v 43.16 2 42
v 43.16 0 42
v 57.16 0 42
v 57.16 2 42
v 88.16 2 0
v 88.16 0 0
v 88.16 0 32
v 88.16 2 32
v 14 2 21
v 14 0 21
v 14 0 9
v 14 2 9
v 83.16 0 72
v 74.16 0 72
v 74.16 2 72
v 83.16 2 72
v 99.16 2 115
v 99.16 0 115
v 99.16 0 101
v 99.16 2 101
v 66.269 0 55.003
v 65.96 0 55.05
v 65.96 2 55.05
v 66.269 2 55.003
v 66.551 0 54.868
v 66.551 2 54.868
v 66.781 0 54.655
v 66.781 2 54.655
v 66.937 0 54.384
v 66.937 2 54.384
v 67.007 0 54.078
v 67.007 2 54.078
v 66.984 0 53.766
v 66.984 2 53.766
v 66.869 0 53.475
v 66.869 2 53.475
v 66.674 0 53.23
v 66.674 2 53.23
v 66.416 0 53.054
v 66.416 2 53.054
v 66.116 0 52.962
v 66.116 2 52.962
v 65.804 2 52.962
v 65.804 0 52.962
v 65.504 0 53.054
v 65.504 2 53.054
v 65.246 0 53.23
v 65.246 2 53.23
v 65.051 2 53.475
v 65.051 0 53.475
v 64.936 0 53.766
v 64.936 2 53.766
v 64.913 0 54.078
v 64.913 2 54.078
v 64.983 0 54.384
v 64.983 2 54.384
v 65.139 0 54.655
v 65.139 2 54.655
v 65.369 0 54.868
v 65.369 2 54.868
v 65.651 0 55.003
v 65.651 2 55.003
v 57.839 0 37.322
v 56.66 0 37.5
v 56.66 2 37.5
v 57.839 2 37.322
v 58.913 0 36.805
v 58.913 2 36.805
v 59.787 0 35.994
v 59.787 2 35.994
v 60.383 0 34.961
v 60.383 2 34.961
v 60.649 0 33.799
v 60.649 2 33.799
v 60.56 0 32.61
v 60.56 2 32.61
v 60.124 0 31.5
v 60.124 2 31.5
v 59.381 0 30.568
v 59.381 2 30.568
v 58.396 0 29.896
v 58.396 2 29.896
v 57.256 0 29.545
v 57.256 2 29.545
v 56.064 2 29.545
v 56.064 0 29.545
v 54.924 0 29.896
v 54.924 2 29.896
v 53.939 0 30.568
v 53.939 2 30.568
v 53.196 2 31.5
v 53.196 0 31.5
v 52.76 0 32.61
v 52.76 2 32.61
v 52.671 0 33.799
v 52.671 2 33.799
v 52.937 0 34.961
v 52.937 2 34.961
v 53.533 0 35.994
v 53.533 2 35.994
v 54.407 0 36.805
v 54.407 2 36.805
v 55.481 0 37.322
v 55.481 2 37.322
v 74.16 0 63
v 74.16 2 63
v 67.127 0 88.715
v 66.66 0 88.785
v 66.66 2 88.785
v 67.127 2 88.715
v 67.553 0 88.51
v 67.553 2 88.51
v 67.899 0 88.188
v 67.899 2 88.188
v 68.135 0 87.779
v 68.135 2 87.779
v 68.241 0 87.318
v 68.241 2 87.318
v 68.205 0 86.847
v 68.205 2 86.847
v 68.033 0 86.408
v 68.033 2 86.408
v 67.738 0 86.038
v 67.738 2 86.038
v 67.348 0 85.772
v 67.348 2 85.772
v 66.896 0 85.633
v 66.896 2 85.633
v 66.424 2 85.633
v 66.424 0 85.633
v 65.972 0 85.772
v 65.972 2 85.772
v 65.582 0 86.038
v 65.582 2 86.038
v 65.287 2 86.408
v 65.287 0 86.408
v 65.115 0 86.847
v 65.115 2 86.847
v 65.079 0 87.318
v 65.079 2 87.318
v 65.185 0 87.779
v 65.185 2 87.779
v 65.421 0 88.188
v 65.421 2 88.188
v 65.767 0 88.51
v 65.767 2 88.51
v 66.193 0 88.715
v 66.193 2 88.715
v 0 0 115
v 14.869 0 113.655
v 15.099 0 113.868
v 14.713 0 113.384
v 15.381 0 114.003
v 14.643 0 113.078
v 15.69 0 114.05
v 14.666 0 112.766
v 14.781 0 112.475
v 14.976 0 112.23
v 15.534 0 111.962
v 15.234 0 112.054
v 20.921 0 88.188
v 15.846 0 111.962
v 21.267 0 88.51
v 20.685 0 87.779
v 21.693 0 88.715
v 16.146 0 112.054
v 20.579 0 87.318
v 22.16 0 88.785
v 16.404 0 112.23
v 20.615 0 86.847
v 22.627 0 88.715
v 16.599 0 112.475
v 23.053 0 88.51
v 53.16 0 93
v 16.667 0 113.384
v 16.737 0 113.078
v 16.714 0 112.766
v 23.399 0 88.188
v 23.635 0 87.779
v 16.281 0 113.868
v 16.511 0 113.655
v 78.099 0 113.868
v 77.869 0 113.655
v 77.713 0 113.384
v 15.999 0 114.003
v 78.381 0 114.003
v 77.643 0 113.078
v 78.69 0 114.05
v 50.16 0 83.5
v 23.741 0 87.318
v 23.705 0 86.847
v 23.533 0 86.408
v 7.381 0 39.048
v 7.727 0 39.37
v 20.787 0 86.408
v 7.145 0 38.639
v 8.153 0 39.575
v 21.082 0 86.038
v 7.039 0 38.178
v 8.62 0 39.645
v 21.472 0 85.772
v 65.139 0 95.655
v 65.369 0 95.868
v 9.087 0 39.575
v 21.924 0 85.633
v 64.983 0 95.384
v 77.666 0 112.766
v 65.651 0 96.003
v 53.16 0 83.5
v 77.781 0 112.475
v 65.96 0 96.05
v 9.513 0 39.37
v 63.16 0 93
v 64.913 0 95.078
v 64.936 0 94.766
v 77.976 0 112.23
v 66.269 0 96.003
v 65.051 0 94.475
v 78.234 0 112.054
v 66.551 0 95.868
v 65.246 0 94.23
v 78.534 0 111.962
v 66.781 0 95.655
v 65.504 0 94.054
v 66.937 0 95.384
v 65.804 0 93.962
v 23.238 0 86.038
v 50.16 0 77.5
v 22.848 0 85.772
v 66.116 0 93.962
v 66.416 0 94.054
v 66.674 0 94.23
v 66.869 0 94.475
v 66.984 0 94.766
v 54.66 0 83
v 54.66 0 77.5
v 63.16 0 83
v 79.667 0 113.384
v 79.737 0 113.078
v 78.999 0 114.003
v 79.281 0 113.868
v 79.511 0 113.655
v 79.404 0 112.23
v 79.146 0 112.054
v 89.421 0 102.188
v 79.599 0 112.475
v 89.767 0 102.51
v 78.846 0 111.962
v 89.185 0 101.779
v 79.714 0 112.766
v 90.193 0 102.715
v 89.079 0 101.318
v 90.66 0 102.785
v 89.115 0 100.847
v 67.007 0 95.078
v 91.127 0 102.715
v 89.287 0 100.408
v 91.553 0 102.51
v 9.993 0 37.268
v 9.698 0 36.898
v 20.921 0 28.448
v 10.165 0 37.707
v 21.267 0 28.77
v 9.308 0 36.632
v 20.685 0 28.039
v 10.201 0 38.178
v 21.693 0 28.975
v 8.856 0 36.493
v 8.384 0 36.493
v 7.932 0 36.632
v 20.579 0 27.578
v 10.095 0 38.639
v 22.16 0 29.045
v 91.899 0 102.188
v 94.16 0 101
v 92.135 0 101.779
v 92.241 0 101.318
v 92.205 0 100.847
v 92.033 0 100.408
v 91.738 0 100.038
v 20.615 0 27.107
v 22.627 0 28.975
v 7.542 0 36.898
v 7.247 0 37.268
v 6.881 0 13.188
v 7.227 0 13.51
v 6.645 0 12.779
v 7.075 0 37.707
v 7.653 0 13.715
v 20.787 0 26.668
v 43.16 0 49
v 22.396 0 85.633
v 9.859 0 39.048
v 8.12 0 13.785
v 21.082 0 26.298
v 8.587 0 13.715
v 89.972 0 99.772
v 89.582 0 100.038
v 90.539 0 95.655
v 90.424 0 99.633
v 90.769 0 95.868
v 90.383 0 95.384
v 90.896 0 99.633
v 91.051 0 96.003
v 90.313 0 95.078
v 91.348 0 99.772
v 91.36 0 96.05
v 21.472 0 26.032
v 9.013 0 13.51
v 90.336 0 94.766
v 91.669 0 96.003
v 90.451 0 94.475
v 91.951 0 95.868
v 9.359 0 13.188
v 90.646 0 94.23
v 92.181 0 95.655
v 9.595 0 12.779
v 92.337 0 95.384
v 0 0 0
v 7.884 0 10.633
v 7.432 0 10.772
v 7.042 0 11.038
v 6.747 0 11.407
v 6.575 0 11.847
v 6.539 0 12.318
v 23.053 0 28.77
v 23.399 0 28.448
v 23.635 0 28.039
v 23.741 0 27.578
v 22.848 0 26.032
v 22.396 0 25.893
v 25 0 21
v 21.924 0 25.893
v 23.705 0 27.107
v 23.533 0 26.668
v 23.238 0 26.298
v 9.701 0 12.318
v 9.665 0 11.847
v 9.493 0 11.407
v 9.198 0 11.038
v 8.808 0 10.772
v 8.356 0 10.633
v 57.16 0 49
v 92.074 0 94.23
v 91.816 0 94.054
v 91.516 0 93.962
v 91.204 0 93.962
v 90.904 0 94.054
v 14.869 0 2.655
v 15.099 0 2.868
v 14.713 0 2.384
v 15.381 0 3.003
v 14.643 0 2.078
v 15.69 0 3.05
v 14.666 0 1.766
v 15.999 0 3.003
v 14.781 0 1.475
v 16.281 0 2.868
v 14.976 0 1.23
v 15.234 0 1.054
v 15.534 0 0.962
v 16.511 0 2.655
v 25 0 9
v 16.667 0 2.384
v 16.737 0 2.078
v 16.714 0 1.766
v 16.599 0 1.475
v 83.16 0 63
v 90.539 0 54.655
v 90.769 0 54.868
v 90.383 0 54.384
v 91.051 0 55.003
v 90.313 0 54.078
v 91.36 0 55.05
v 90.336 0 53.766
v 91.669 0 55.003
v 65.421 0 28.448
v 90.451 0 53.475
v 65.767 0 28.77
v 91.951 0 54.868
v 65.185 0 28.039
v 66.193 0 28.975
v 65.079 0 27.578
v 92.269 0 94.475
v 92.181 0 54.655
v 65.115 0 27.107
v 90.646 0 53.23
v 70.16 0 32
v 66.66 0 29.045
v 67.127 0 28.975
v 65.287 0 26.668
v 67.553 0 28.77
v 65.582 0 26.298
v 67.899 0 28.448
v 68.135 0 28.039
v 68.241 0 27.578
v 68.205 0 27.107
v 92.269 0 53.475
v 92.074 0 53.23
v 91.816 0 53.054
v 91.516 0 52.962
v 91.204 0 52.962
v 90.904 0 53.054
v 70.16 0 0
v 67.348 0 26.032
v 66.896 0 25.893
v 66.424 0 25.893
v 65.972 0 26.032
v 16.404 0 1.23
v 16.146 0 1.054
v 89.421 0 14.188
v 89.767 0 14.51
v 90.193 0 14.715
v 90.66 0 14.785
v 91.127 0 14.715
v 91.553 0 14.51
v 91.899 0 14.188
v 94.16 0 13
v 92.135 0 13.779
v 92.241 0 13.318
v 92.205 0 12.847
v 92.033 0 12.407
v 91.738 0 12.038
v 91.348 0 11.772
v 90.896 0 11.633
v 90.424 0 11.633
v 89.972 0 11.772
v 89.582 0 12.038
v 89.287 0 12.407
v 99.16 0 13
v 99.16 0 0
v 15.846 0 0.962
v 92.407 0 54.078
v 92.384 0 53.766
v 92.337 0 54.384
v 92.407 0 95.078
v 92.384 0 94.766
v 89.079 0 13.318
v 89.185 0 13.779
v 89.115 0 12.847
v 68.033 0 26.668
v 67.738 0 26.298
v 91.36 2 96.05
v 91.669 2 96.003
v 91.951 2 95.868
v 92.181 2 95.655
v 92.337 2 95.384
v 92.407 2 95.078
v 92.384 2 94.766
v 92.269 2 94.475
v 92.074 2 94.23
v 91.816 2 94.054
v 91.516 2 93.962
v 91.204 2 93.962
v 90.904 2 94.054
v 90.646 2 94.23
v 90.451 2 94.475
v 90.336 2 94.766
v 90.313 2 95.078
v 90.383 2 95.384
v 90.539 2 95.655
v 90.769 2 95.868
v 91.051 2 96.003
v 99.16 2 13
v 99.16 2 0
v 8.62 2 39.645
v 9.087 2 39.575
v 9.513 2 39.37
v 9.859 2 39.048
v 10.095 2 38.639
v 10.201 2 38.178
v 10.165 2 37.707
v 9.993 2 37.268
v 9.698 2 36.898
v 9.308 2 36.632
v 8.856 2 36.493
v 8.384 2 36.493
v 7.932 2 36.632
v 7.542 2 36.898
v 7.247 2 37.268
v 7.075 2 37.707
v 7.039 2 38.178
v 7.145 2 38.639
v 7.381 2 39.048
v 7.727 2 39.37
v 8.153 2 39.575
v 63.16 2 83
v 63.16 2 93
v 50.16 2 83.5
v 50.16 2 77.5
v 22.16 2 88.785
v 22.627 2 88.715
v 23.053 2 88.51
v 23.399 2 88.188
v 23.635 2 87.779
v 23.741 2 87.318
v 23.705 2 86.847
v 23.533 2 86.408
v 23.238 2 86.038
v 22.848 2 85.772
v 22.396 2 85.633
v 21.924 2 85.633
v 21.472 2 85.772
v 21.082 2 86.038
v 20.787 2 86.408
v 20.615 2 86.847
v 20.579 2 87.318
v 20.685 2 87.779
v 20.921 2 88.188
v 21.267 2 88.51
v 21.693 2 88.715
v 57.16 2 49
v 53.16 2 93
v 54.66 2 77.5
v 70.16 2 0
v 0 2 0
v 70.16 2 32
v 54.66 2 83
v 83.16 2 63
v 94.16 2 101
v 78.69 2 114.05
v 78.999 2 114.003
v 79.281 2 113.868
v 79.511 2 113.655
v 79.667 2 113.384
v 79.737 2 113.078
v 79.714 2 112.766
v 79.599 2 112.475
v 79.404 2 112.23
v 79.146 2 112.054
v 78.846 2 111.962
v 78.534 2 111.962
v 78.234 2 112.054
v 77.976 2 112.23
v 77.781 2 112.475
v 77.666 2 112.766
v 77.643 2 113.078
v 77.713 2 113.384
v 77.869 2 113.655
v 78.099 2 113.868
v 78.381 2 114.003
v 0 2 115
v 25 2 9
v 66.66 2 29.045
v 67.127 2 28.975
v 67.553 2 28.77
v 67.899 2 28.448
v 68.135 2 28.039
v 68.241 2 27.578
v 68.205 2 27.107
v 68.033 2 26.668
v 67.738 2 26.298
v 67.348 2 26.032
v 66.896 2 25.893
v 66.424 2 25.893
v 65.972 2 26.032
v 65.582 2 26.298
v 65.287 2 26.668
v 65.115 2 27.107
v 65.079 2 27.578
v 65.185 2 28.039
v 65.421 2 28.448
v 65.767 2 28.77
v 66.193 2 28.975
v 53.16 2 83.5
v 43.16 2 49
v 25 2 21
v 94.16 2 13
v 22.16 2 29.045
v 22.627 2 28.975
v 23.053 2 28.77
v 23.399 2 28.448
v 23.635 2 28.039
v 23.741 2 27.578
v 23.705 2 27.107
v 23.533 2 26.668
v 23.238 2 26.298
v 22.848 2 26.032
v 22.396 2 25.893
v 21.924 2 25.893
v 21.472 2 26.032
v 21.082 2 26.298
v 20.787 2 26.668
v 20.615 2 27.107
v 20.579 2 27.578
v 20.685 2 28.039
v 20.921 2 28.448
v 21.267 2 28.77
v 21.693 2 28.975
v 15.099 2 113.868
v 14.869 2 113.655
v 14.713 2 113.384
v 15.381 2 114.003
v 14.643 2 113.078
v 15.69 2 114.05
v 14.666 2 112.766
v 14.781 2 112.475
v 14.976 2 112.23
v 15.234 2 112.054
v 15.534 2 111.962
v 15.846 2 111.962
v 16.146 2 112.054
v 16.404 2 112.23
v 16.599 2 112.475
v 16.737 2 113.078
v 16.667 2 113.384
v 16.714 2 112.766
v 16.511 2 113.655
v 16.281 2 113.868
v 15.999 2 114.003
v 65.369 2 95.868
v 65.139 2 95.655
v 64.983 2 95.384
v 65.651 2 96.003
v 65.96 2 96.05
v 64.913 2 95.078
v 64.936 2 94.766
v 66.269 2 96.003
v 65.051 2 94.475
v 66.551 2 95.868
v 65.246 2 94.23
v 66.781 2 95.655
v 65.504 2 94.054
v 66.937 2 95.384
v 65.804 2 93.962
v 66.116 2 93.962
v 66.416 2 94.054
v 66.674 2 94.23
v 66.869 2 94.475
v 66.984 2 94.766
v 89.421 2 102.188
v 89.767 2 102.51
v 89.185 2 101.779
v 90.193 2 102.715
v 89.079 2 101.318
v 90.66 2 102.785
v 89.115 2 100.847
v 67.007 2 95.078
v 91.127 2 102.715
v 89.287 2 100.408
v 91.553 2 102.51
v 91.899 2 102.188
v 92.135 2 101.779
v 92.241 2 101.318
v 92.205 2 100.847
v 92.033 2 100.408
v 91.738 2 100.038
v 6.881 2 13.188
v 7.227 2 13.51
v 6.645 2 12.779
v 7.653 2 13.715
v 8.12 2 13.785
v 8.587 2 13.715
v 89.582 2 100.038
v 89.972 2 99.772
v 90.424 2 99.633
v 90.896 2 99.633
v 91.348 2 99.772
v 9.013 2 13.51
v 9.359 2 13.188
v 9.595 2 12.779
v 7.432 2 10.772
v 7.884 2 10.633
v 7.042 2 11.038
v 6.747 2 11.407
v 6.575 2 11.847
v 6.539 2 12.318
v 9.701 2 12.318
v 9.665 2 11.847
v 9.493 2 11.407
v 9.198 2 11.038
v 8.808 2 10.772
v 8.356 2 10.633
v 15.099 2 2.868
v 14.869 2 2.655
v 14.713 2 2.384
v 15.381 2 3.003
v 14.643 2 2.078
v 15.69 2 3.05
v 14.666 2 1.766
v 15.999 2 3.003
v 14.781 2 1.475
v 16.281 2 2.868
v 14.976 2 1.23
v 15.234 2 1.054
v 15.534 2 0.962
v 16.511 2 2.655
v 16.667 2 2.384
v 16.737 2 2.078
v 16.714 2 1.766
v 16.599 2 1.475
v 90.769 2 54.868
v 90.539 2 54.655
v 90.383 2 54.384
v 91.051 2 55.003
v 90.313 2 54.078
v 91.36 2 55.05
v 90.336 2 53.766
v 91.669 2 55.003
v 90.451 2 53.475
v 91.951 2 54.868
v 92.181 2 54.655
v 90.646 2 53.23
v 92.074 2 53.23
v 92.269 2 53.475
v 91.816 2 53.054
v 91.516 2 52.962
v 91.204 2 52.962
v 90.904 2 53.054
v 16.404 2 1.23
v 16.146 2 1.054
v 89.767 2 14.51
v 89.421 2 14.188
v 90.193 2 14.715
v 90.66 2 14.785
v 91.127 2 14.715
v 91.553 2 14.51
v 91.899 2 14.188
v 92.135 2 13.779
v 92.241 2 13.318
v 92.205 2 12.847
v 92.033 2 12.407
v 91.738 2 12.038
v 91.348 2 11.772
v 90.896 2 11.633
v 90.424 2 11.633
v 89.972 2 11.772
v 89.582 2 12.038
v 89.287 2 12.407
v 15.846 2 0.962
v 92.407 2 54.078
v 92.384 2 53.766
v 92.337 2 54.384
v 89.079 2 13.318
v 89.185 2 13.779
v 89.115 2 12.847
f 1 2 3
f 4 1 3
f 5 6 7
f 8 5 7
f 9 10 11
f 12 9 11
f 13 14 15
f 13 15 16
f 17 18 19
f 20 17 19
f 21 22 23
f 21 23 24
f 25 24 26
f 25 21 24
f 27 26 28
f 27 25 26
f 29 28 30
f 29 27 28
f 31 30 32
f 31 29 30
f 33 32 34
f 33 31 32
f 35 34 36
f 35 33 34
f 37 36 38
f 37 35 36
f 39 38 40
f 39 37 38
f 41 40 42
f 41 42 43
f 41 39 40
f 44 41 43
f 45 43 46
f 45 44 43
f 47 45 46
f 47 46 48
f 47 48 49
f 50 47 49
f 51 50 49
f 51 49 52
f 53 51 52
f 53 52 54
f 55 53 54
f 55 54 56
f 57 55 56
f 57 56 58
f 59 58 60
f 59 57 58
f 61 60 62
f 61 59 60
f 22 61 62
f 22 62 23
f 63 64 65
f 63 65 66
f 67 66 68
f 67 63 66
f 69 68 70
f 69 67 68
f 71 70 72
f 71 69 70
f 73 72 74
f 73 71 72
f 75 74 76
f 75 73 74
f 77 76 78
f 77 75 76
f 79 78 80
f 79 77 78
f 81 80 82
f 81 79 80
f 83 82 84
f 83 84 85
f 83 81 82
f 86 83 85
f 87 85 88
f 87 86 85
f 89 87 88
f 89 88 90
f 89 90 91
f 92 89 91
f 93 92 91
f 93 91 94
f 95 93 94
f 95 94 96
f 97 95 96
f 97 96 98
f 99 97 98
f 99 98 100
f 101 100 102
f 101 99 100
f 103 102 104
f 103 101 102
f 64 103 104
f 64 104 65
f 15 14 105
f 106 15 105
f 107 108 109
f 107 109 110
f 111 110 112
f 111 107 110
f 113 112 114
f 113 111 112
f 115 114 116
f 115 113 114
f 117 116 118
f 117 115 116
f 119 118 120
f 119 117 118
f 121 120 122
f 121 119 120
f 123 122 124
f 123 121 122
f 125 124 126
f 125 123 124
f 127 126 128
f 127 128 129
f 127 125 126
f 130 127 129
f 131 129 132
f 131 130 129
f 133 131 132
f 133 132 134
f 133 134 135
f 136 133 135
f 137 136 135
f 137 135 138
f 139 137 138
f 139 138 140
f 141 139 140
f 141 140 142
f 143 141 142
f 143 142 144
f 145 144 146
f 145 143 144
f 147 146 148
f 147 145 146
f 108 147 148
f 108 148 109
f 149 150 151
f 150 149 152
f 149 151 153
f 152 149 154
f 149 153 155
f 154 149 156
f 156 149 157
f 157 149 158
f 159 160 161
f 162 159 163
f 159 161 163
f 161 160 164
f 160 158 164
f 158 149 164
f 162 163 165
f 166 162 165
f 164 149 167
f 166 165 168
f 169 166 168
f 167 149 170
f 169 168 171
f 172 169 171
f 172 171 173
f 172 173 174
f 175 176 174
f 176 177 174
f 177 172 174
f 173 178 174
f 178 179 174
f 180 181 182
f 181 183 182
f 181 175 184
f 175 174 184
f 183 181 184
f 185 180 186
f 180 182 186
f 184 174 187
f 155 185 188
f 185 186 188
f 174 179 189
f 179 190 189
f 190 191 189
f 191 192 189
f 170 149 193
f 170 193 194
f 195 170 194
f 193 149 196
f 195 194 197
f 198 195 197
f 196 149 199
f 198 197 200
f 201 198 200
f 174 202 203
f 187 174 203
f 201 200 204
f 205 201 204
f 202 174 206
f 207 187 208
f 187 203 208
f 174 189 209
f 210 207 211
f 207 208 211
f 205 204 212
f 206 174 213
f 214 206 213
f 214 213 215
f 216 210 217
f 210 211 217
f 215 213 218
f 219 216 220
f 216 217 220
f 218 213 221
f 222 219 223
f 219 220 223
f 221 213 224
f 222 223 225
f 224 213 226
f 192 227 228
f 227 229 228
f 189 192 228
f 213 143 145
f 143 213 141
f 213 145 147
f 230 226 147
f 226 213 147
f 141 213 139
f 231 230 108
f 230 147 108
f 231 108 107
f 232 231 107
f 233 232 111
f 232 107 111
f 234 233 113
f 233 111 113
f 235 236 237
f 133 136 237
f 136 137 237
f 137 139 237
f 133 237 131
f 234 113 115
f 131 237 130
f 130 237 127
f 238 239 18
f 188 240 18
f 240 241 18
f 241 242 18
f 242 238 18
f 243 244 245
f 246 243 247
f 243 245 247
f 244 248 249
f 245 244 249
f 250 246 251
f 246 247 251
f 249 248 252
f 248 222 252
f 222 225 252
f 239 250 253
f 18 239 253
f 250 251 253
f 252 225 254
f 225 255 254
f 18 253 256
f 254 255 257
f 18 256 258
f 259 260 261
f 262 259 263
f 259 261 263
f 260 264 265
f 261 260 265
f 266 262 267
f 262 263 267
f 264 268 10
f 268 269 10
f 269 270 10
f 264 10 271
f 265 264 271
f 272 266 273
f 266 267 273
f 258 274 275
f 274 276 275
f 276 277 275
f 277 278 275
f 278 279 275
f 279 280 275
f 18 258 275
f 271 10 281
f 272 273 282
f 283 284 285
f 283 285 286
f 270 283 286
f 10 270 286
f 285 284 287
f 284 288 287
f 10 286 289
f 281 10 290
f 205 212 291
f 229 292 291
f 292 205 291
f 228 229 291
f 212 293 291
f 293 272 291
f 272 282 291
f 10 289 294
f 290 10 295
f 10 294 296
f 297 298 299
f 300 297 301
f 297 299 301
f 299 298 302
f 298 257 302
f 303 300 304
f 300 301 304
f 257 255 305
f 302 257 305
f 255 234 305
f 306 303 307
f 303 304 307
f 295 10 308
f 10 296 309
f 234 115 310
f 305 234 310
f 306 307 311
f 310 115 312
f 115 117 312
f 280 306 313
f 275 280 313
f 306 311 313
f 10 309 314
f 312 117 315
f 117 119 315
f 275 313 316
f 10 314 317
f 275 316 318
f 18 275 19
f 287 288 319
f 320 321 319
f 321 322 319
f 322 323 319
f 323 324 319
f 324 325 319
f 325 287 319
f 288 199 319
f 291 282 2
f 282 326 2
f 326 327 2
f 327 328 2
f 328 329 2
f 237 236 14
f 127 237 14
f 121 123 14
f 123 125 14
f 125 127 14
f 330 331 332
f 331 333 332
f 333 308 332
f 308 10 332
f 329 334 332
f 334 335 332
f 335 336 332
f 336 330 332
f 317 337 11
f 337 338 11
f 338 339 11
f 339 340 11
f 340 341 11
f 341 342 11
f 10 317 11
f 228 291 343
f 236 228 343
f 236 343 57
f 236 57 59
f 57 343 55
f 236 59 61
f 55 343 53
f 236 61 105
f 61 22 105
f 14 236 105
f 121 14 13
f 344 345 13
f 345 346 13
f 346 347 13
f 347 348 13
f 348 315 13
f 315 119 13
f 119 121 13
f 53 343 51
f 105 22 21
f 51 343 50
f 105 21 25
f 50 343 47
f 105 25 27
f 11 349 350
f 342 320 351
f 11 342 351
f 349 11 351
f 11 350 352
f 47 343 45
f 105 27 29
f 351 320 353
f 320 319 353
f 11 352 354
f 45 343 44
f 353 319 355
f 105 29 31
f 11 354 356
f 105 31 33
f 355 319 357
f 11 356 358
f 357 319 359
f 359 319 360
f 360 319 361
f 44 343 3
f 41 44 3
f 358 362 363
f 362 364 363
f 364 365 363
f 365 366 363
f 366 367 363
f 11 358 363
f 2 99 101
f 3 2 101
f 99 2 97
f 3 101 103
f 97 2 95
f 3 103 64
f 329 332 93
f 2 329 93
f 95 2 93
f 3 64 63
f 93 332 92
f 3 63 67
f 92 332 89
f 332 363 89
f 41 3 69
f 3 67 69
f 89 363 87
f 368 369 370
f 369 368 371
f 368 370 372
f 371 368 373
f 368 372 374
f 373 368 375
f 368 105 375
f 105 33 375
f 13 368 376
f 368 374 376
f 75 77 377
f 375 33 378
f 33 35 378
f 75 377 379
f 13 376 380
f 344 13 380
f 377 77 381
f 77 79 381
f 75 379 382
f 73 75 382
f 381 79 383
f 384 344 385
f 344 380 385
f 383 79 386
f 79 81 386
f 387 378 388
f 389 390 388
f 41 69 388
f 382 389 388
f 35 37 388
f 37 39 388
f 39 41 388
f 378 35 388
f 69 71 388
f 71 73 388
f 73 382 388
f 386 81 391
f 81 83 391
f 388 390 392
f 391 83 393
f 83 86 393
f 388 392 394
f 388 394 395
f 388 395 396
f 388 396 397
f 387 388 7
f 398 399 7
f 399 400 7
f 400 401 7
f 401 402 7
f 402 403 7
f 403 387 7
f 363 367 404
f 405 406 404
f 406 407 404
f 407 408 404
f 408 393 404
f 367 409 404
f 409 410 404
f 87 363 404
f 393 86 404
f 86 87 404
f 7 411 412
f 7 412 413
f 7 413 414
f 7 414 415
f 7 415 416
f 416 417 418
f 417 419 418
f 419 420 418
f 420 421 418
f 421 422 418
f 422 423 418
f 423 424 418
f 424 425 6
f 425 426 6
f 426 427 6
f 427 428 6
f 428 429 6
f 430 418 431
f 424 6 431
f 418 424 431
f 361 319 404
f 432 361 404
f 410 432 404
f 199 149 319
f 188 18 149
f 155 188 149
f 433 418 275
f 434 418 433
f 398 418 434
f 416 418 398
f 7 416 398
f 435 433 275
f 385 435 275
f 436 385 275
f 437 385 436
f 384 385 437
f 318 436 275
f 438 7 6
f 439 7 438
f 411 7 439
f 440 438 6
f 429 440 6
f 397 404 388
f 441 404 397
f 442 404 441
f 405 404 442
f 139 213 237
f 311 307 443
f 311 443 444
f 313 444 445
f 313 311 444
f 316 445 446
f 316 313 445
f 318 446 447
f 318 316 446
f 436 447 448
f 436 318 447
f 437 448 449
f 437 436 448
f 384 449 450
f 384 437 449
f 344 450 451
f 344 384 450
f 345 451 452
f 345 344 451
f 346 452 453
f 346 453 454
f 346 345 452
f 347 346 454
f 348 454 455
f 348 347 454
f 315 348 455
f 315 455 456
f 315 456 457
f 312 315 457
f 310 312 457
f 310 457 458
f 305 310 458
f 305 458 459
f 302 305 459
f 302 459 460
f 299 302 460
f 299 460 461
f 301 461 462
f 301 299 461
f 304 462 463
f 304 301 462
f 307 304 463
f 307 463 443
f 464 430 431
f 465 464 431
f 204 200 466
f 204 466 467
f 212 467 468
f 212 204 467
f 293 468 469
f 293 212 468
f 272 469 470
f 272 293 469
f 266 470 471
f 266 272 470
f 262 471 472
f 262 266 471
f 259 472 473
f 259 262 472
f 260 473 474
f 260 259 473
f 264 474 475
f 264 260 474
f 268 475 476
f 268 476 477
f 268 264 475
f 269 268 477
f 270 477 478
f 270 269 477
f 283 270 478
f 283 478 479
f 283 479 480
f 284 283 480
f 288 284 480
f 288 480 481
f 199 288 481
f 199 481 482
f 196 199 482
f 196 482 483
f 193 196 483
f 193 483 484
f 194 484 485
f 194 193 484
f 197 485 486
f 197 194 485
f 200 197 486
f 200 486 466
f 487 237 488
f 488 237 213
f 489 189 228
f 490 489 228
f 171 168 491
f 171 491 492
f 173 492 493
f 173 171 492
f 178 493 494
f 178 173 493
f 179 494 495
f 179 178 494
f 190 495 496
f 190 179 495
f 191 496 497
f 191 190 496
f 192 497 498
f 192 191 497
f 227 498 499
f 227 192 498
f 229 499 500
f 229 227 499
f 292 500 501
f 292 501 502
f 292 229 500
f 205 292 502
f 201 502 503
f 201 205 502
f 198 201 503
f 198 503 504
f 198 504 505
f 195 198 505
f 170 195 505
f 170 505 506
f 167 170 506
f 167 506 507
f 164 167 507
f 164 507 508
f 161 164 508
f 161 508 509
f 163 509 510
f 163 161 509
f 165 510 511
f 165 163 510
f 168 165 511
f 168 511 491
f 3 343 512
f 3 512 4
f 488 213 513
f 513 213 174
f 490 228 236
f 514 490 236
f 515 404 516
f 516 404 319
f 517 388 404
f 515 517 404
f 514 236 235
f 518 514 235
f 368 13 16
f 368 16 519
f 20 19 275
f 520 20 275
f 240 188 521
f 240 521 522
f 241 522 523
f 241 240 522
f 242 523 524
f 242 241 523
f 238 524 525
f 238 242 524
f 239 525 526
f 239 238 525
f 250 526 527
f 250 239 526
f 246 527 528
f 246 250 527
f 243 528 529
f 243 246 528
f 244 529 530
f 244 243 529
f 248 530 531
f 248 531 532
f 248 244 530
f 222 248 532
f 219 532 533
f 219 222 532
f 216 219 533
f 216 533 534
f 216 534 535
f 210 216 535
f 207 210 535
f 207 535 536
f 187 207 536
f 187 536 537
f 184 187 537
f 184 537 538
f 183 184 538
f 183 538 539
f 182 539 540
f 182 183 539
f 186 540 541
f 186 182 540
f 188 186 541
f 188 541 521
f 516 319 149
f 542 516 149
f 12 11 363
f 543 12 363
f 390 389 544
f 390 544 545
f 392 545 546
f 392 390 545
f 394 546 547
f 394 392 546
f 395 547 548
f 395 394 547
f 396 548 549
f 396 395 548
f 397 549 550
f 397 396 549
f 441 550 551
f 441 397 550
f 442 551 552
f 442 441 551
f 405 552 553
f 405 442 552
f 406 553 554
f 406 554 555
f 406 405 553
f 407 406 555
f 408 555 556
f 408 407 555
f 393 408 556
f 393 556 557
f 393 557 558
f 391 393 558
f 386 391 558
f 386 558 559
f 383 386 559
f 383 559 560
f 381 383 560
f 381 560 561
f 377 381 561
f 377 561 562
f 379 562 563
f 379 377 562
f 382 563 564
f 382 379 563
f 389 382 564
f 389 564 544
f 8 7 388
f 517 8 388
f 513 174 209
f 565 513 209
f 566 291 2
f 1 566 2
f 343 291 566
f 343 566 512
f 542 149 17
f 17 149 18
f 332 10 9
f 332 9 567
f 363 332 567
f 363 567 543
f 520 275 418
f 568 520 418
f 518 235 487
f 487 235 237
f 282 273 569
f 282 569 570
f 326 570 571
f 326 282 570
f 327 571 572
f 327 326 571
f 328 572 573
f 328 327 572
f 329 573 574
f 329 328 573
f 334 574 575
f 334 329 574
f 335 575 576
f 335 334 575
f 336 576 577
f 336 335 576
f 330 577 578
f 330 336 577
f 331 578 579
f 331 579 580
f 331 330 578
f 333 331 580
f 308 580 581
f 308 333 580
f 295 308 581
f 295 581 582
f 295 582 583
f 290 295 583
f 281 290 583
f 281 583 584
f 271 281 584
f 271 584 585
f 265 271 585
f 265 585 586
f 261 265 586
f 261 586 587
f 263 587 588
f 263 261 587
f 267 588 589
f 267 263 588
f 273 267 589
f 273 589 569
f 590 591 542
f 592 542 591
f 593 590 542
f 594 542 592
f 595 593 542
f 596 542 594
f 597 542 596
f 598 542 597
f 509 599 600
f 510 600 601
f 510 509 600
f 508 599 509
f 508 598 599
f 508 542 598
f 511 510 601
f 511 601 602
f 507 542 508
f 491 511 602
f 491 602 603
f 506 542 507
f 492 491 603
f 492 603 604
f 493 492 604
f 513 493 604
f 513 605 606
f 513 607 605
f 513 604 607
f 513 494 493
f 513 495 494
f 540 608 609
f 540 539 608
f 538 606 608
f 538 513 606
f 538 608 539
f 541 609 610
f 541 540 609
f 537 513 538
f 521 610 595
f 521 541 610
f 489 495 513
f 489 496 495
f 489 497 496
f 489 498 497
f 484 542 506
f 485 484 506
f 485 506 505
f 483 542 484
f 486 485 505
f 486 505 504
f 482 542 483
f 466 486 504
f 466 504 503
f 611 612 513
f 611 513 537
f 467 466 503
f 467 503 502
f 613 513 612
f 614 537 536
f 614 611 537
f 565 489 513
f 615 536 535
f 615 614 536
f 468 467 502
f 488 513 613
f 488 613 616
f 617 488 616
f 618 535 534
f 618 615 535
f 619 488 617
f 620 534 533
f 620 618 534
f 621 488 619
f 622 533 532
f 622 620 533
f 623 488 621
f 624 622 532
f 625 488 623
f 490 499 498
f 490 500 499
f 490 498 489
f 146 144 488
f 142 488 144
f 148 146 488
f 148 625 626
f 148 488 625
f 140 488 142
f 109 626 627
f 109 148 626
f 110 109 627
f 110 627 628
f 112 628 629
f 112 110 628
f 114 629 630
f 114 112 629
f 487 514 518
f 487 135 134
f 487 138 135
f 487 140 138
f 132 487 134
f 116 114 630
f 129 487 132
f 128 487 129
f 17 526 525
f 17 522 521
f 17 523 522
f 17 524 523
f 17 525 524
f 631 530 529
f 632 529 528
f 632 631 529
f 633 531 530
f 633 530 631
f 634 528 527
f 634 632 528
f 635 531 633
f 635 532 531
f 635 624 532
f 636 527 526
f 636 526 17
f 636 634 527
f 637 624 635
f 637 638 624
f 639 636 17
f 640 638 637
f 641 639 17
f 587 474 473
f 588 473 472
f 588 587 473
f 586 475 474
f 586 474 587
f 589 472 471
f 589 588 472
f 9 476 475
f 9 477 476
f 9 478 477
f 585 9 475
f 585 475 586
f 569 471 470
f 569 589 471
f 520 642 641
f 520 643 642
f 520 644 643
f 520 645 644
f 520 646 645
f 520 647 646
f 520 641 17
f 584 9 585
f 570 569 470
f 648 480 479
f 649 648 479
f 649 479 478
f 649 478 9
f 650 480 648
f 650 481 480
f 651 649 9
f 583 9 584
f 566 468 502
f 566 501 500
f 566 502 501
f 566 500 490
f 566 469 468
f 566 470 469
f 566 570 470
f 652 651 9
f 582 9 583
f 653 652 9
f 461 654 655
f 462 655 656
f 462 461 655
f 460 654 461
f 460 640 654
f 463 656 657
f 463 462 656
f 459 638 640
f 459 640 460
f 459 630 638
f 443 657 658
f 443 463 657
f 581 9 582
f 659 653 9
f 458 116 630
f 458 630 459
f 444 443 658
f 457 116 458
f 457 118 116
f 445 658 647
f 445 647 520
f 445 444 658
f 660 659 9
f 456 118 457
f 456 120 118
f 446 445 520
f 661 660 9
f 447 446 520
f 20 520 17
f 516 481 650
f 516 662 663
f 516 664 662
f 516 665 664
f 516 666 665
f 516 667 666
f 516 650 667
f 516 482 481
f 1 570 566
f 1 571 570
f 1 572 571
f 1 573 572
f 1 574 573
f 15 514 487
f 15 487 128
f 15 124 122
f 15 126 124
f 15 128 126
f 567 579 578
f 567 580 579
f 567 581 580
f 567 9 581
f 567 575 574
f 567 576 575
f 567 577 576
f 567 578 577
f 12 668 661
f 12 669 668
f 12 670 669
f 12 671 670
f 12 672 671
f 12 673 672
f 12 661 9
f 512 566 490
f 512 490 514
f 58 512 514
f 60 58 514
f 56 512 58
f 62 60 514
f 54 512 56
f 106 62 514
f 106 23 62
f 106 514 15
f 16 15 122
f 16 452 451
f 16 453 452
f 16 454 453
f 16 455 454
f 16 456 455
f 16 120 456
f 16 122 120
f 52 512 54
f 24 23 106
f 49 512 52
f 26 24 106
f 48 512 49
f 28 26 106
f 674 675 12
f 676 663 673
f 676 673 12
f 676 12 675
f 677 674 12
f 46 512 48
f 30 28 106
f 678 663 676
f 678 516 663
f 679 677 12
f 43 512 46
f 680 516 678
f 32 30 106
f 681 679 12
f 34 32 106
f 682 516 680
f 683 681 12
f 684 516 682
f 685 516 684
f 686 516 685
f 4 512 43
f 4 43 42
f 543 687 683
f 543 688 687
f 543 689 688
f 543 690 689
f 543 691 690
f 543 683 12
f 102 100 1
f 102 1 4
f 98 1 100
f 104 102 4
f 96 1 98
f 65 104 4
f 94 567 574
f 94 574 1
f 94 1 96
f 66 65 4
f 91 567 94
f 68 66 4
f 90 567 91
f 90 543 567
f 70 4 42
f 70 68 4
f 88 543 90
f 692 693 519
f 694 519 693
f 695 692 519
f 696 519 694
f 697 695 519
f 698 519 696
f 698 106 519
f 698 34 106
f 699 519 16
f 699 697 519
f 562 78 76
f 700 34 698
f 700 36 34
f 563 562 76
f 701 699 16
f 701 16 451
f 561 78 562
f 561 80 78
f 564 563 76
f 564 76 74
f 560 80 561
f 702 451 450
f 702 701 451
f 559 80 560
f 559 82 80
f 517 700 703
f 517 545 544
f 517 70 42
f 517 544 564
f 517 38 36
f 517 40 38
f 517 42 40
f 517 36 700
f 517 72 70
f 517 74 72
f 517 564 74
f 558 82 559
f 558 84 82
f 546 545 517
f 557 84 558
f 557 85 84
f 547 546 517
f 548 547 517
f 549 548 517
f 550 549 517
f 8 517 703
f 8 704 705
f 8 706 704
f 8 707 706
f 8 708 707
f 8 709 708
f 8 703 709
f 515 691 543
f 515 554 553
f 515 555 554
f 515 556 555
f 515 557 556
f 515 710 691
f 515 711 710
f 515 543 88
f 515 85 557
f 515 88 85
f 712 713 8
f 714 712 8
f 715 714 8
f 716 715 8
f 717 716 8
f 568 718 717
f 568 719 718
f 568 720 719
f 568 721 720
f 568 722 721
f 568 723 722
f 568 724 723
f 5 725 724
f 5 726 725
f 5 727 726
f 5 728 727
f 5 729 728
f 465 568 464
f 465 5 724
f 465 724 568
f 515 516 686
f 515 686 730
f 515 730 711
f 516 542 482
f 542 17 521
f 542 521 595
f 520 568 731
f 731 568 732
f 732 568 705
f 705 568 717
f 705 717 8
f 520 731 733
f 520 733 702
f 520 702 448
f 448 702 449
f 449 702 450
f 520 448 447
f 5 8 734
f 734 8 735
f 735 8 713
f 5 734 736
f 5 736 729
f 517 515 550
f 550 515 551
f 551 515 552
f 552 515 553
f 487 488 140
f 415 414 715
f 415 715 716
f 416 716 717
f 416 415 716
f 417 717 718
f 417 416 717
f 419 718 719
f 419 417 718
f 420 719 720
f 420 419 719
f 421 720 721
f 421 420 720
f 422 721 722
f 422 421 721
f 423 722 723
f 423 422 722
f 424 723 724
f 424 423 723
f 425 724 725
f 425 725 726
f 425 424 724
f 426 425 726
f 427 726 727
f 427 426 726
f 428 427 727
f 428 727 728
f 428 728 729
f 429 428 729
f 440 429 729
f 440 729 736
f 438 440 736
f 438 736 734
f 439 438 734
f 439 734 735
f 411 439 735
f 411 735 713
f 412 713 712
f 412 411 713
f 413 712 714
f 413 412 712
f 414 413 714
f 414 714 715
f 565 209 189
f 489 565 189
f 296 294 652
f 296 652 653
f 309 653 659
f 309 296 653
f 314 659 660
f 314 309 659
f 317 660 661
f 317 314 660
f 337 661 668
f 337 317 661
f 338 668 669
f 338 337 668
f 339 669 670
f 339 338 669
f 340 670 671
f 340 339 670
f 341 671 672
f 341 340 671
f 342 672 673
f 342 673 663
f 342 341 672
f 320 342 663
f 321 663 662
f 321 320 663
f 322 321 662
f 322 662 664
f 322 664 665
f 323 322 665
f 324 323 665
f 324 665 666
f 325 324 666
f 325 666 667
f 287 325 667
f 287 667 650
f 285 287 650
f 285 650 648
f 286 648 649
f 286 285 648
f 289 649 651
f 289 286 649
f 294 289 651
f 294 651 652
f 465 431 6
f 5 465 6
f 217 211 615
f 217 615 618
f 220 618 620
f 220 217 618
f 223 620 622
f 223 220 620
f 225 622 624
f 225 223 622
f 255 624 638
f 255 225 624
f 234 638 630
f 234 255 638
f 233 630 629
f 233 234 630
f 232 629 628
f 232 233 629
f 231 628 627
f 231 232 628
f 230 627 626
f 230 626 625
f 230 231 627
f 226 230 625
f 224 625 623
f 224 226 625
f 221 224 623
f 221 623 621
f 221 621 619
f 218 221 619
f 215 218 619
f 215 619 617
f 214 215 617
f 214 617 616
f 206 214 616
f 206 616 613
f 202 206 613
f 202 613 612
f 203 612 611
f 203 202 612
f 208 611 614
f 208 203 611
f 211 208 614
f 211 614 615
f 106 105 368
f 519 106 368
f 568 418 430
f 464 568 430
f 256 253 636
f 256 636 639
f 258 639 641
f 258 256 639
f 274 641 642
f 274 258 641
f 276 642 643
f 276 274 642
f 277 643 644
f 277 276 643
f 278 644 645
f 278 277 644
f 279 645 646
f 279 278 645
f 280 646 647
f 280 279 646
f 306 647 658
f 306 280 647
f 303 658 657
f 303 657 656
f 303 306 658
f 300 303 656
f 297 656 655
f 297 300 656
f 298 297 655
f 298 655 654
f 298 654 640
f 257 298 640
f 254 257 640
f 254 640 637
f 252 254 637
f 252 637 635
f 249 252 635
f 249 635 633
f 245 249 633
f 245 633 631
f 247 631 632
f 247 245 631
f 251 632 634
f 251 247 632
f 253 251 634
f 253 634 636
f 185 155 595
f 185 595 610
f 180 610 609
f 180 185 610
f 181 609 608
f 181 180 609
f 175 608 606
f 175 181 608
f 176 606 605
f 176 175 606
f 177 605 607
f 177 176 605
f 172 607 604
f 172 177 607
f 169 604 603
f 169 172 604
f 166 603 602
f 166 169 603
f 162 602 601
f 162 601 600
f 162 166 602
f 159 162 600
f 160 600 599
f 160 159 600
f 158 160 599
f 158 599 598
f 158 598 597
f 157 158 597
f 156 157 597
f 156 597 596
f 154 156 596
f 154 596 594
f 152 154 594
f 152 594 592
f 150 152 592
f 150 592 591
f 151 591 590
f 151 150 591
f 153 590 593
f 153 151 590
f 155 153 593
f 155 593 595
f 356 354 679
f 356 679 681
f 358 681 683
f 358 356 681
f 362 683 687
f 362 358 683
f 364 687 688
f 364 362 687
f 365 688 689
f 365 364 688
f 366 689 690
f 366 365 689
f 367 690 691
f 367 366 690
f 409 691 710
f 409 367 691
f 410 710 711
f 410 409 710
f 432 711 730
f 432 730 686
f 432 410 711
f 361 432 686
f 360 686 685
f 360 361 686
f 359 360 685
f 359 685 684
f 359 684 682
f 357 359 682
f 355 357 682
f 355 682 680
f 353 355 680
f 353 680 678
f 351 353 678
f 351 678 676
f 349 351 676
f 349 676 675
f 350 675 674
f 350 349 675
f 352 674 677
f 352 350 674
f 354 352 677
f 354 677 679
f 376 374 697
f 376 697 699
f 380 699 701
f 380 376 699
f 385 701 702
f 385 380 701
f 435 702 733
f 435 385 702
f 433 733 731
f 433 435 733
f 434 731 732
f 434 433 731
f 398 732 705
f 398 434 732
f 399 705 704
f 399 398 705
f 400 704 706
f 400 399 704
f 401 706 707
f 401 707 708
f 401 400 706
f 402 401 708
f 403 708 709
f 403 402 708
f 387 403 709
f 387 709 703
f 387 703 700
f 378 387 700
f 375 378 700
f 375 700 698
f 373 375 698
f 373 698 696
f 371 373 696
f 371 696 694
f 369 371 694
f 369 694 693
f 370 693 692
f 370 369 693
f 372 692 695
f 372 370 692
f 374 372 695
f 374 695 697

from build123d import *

# Parameters (mm, degrees)
SKETCH_1_R      = 1.05
SKETCH_1_R_2    = 1.585
SKETCH_1_W      = 9
SKETCH_1_H      = 9
SKETCH_1_W_2    = 11
SKETCH_1_H_2    = 12
SKETCH_1_W_3    = 14
SKETCH_1_H_3    = 7
SKETCH_1_R_3    = 4
EXTRUDE_1_DEPTH = 2


with BuildPart() as part:
    # 草图1 → 凸台-拉伸1 (new body)
    with BuildSketch(Plane(origin=(0, 0, 0), x_dir=(1, 0, 0), z_dir=(0, 1, 0))):
        Polygon((70.16, 0), (0, 0), (0, -115), (99.16, -115), (99.16, -101), (94.16, -101), (94.16, -13), (99.16, -13), (99.16, 0), (88.16, 0), (88.16, -32), (70.16, -32), align=None)
        with Locations(Location((15.69, -113, 0), (0, 0, 270))):
            Circle(SKETCH_1_R, mode=Mode.SUBTRACT)
        with Locations(Location((22.16, -87.2, 0), (0, 0, 270))):
            Circle(SKETCH_1_R_2, mode=Mode.SUBTRACT)
        with Locations(Location((65.96, -95, 0), (0, 0, 270))):
            Circle(SKETCH_1_R, mode=Mode.SUBTRACT)
        with Locations(Location((66.66, -87.2, 0), (0, 0, 270))):
            Circle(SKETCH_1_R_2, mode=Mode.SUBTRACT)
        with Locations(Location((78.69, -113, 0), (0, 0, 270))):
            Circle(SKETCH_1_R, mode=Mode.SUBTRACT)
        with Locations(Location((90.66, -101.2, 0), (0, 0, 270))):
            Circle(SKETCH_1_R_2, mode=Mode.SUBTRACT)
        with Locations(Location((91.36, -95, 0), (0, 0, 270))):
            Circle(SKETCH_1_R, mode=Mode.SUBTRACT)
        Polygon((50.16, -83.5), (50.16, -77.5), (54.66, -77.5), (54.66, -83), (63.16, -83), (63.16, -93), (53.16, -93), (53.16, -83.5), align=None, mode=Mode.SUBTRACT)
        with Locations((78.66, -67.5)):
            Rectangle(SKETCH_1_W, SKETCH_1_H, mode=Mode.SUBTRACT)
        with Locations(Location((22.16, -27.46, 0), (0, 0, 270))):
            Circle(SKETCH_1_R_2, mode=Mode.SUBTRACT)
        with Locations((19.5, -15)):
            Rectangle(SKETCH_1_W_2, SKETCH_1_H_2, mode=Mode.SUBTRACT)
        with Locations(Location((15.69, -2, 0), (0, 0, 270))):
            Circle(SKETCH_1_R, mode=Mode.SUBTRACT)
        with Locations((50.16, -45.5)):
            Rectangle(SKETCH_1_W_3, SKETCH_1_H_3, mode=Mode.SUBTRACT)
        with Locations(Location((65.96, -54, 0), (0, 0, 270))):
            Circle(SKETCH_1_R, mode=Mode.SUBTRACT)
        with Locations(Location((56.66, -33.5, 0), (0, 0, 270))):
            Circle(SKETCH_1_R_3, mode=Mode.SUBTRACT)
        with Locations(Location((91.36, -54, 0), (0, 0, 270))):
            Circle(SKETCH_1_R, mode=Mode.SUBTRACT)
        with Locations(Location((66.66, -27.46, 0), (0, 0, 270))):
            Circle(SKETCH_1_R_2, mode=Mode.SUBTRACT)
        with Locations(Location((90.66, -13.2, 0), (0, 0, 270))):
            Circle(SKETCH_1_R_2, mode=Mode.SUBTRACT)
        with Locations(Location((8.12, -12.2, 0), (0, 0, 270))):
            Circle(SKETCH_1_R_2, mode=Mode.SUBTRACT)
        with Locations(Location((8.62, -38.06, 0), (0, 0, 270))):
            Circle(SKETCH_1_R_2, mode=Mode.SUBTRACT)
    extrude(amount=EXTRUDE_1_DEPTH)


solid = part.part
